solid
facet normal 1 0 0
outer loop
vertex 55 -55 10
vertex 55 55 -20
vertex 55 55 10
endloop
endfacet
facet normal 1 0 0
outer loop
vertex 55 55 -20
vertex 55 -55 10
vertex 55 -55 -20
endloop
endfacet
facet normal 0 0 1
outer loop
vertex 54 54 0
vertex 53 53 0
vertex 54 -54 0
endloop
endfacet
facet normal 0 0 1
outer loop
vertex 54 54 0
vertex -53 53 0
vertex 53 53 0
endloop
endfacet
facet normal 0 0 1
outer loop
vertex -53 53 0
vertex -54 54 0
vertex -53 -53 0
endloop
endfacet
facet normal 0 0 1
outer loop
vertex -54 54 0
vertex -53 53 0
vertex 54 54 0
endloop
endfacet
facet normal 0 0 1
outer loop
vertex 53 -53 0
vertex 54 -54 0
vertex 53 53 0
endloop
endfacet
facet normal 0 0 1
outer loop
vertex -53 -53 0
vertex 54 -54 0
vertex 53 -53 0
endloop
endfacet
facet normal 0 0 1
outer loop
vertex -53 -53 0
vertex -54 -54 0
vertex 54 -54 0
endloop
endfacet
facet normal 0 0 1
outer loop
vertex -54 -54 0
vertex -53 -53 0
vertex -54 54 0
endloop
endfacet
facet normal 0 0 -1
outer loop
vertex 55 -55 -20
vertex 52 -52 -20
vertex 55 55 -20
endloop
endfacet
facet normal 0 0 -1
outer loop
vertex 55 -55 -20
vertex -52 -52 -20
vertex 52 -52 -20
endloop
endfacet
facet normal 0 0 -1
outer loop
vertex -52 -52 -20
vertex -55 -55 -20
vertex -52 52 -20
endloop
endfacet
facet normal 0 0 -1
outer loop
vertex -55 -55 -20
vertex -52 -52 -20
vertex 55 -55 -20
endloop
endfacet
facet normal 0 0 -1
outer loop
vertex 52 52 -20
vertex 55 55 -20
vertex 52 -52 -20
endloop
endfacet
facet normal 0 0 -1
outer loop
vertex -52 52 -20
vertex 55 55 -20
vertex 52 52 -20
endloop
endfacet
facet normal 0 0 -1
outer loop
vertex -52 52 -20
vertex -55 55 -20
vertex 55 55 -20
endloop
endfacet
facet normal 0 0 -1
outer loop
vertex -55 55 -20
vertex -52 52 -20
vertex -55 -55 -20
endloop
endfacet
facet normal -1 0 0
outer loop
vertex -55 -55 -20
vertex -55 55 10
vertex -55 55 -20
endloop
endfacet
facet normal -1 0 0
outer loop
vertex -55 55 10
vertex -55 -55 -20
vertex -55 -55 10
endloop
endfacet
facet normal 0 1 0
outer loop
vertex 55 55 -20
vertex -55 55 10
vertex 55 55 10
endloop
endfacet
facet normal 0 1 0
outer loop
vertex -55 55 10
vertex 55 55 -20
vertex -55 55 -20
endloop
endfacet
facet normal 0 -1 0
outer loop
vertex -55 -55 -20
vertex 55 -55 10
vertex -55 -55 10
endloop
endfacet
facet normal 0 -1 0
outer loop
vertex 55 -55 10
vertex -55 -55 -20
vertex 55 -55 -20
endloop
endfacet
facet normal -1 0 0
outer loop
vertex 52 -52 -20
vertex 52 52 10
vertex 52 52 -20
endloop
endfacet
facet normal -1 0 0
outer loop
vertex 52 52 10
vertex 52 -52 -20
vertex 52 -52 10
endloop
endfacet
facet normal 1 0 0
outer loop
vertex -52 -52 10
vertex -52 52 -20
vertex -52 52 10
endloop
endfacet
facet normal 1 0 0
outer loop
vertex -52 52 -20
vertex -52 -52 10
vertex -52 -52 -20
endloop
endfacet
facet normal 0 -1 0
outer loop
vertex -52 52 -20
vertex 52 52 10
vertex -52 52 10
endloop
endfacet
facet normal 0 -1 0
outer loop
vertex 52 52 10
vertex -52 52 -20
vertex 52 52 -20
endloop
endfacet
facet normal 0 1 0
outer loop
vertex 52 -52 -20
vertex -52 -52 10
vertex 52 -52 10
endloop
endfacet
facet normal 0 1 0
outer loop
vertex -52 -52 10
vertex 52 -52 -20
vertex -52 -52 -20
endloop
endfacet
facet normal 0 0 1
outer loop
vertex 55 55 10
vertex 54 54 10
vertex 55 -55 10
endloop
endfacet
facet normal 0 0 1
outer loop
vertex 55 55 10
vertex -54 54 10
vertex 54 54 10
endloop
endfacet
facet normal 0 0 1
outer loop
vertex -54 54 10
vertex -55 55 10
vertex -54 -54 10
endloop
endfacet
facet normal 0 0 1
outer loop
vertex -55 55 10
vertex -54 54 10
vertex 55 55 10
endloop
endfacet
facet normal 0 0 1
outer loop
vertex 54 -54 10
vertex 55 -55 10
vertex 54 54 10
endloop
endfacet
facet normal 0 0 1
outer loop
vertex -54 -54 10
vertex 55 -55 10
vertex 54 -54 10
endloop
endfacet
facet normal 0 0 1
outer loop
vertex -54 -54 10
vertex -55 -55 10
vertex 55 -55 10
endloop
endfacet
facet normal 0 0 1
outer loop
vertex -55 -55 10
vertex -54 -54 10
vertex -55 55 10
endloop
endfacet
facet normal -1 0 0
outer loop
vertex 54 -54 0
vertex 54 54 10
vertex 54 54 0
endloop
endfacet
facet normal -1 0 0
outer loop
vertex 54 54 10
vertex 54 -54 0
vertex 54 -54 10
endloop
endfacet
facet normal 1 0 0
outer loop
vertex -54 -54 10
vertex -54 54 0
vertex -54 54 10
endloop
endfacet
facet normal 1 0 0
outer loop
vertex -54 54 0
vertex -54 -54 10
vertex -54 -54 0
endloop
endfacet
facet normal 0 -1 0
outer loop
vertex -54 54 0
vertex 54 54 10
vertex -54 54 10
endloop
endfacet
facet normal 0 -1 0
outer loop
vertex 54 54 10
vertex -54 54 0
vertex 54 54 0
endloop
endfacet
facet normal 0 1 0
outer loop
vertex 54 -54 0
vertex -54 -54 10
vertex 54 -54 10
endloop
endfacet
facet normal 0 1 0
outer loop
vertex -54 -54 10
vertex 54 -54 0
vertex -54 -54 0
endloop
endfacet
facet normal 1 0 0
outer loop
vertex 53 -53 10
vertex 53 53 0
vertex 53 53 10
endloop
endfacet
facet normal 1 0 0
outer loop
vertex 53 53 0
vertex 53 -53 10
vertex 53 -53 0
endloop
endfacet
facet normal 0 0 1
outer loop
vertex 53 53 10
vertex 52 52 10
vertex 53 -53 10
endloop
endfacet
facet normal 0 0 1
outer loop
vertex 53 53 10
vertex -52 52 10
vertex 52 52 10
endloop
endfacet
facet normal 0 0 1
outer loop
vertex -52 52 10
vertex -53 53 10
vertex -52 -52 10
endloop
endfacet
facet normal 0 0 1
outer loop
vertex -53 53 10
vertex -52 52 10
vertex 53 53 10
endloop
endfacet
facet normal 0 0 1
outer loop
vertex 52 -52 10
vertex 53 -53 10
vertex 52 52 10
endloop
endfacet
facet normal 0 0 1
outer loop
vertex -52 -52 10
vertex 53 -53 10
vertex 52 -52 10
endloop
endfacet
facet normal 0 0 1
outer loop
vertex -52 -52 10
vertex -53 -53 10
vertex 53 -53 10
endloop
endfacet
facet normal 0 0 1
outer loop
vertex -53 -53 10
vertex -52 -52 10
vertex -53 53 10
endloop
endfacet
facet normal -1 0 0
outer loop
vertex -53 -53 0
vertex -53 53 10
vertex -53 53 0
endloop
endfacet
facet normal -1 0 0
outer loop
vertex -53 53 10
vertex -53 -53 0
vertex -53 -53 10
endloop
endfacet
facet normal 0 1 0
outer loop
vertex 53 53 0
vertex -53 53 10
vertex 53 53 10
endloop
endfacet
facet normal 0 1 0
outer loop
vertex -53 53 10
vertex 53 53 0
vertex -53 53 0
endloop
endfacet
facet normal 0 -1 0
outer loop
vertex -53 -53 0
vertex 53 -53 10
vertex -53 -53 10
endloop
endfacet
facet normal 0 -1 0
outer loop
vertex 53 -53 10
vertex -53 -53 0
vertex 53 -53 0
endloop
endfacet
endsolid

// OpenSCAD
// Custom Wiper Box by Matt Johnson
// intentional3D
// Use this to customize your own nozzle wiper for multi extruding printers.


//


width = 110;
depth = 110;
height = 10;
wallThickness = 1;
gap=1;
base=10;






gapThickness = gap+1;


base();


module base() 
    {
        union() 
        {
                 //base
                difference()
                { 
                    translate([-(width)/2, -(depth)/2, -height-base]) 
                    {
                
                        cube([width,depth,height+base]);
                    }
                
        
                translate([(width-2*gapThickness-2*wallThickness)/-2,(depth-2*gapThickness-2*wallThickness)/-2,-50]) 
                    {
                        cube([(width-2*gapThickness-2*wallThickness),(depth-2*gapThickness-2*wallThickness),100]);
                    }
     
                }
            // Outer Wall
            difference()
            {
                translate([-width/2, -depth/2, 0]) 
                {
                    cube([width,depth,height]);
                }
	
                translate([(-width/2) + wallThickness, -depth/2 + wallThickness, -50]) 
                {
                    cube([width - (wallThickness * 2), depth - (wallThickness * 2), 100]);
                }
                                
            }
            // inner wall
                difference()
                { 
                    translate([-(width-2*gapThickness)/2, -(depth-2*gapThickness)/2, 0]) 
                    {
                
                        cube([width-2*gapThickness,depth-2*gapThickness,height]);
                    }
                
        
                translate([(width-2*gapThickness-2*wallThickness)/-2,(depth-2*gapThickness-2*wallThickness)/-2,-height]) 
                    {
                        cube([(width-2*gapThickness-2*wallThickness),(depth-2*gapThickness-2*wallThickness),100]);
                    }
     
                }
           
                
            }
        }
